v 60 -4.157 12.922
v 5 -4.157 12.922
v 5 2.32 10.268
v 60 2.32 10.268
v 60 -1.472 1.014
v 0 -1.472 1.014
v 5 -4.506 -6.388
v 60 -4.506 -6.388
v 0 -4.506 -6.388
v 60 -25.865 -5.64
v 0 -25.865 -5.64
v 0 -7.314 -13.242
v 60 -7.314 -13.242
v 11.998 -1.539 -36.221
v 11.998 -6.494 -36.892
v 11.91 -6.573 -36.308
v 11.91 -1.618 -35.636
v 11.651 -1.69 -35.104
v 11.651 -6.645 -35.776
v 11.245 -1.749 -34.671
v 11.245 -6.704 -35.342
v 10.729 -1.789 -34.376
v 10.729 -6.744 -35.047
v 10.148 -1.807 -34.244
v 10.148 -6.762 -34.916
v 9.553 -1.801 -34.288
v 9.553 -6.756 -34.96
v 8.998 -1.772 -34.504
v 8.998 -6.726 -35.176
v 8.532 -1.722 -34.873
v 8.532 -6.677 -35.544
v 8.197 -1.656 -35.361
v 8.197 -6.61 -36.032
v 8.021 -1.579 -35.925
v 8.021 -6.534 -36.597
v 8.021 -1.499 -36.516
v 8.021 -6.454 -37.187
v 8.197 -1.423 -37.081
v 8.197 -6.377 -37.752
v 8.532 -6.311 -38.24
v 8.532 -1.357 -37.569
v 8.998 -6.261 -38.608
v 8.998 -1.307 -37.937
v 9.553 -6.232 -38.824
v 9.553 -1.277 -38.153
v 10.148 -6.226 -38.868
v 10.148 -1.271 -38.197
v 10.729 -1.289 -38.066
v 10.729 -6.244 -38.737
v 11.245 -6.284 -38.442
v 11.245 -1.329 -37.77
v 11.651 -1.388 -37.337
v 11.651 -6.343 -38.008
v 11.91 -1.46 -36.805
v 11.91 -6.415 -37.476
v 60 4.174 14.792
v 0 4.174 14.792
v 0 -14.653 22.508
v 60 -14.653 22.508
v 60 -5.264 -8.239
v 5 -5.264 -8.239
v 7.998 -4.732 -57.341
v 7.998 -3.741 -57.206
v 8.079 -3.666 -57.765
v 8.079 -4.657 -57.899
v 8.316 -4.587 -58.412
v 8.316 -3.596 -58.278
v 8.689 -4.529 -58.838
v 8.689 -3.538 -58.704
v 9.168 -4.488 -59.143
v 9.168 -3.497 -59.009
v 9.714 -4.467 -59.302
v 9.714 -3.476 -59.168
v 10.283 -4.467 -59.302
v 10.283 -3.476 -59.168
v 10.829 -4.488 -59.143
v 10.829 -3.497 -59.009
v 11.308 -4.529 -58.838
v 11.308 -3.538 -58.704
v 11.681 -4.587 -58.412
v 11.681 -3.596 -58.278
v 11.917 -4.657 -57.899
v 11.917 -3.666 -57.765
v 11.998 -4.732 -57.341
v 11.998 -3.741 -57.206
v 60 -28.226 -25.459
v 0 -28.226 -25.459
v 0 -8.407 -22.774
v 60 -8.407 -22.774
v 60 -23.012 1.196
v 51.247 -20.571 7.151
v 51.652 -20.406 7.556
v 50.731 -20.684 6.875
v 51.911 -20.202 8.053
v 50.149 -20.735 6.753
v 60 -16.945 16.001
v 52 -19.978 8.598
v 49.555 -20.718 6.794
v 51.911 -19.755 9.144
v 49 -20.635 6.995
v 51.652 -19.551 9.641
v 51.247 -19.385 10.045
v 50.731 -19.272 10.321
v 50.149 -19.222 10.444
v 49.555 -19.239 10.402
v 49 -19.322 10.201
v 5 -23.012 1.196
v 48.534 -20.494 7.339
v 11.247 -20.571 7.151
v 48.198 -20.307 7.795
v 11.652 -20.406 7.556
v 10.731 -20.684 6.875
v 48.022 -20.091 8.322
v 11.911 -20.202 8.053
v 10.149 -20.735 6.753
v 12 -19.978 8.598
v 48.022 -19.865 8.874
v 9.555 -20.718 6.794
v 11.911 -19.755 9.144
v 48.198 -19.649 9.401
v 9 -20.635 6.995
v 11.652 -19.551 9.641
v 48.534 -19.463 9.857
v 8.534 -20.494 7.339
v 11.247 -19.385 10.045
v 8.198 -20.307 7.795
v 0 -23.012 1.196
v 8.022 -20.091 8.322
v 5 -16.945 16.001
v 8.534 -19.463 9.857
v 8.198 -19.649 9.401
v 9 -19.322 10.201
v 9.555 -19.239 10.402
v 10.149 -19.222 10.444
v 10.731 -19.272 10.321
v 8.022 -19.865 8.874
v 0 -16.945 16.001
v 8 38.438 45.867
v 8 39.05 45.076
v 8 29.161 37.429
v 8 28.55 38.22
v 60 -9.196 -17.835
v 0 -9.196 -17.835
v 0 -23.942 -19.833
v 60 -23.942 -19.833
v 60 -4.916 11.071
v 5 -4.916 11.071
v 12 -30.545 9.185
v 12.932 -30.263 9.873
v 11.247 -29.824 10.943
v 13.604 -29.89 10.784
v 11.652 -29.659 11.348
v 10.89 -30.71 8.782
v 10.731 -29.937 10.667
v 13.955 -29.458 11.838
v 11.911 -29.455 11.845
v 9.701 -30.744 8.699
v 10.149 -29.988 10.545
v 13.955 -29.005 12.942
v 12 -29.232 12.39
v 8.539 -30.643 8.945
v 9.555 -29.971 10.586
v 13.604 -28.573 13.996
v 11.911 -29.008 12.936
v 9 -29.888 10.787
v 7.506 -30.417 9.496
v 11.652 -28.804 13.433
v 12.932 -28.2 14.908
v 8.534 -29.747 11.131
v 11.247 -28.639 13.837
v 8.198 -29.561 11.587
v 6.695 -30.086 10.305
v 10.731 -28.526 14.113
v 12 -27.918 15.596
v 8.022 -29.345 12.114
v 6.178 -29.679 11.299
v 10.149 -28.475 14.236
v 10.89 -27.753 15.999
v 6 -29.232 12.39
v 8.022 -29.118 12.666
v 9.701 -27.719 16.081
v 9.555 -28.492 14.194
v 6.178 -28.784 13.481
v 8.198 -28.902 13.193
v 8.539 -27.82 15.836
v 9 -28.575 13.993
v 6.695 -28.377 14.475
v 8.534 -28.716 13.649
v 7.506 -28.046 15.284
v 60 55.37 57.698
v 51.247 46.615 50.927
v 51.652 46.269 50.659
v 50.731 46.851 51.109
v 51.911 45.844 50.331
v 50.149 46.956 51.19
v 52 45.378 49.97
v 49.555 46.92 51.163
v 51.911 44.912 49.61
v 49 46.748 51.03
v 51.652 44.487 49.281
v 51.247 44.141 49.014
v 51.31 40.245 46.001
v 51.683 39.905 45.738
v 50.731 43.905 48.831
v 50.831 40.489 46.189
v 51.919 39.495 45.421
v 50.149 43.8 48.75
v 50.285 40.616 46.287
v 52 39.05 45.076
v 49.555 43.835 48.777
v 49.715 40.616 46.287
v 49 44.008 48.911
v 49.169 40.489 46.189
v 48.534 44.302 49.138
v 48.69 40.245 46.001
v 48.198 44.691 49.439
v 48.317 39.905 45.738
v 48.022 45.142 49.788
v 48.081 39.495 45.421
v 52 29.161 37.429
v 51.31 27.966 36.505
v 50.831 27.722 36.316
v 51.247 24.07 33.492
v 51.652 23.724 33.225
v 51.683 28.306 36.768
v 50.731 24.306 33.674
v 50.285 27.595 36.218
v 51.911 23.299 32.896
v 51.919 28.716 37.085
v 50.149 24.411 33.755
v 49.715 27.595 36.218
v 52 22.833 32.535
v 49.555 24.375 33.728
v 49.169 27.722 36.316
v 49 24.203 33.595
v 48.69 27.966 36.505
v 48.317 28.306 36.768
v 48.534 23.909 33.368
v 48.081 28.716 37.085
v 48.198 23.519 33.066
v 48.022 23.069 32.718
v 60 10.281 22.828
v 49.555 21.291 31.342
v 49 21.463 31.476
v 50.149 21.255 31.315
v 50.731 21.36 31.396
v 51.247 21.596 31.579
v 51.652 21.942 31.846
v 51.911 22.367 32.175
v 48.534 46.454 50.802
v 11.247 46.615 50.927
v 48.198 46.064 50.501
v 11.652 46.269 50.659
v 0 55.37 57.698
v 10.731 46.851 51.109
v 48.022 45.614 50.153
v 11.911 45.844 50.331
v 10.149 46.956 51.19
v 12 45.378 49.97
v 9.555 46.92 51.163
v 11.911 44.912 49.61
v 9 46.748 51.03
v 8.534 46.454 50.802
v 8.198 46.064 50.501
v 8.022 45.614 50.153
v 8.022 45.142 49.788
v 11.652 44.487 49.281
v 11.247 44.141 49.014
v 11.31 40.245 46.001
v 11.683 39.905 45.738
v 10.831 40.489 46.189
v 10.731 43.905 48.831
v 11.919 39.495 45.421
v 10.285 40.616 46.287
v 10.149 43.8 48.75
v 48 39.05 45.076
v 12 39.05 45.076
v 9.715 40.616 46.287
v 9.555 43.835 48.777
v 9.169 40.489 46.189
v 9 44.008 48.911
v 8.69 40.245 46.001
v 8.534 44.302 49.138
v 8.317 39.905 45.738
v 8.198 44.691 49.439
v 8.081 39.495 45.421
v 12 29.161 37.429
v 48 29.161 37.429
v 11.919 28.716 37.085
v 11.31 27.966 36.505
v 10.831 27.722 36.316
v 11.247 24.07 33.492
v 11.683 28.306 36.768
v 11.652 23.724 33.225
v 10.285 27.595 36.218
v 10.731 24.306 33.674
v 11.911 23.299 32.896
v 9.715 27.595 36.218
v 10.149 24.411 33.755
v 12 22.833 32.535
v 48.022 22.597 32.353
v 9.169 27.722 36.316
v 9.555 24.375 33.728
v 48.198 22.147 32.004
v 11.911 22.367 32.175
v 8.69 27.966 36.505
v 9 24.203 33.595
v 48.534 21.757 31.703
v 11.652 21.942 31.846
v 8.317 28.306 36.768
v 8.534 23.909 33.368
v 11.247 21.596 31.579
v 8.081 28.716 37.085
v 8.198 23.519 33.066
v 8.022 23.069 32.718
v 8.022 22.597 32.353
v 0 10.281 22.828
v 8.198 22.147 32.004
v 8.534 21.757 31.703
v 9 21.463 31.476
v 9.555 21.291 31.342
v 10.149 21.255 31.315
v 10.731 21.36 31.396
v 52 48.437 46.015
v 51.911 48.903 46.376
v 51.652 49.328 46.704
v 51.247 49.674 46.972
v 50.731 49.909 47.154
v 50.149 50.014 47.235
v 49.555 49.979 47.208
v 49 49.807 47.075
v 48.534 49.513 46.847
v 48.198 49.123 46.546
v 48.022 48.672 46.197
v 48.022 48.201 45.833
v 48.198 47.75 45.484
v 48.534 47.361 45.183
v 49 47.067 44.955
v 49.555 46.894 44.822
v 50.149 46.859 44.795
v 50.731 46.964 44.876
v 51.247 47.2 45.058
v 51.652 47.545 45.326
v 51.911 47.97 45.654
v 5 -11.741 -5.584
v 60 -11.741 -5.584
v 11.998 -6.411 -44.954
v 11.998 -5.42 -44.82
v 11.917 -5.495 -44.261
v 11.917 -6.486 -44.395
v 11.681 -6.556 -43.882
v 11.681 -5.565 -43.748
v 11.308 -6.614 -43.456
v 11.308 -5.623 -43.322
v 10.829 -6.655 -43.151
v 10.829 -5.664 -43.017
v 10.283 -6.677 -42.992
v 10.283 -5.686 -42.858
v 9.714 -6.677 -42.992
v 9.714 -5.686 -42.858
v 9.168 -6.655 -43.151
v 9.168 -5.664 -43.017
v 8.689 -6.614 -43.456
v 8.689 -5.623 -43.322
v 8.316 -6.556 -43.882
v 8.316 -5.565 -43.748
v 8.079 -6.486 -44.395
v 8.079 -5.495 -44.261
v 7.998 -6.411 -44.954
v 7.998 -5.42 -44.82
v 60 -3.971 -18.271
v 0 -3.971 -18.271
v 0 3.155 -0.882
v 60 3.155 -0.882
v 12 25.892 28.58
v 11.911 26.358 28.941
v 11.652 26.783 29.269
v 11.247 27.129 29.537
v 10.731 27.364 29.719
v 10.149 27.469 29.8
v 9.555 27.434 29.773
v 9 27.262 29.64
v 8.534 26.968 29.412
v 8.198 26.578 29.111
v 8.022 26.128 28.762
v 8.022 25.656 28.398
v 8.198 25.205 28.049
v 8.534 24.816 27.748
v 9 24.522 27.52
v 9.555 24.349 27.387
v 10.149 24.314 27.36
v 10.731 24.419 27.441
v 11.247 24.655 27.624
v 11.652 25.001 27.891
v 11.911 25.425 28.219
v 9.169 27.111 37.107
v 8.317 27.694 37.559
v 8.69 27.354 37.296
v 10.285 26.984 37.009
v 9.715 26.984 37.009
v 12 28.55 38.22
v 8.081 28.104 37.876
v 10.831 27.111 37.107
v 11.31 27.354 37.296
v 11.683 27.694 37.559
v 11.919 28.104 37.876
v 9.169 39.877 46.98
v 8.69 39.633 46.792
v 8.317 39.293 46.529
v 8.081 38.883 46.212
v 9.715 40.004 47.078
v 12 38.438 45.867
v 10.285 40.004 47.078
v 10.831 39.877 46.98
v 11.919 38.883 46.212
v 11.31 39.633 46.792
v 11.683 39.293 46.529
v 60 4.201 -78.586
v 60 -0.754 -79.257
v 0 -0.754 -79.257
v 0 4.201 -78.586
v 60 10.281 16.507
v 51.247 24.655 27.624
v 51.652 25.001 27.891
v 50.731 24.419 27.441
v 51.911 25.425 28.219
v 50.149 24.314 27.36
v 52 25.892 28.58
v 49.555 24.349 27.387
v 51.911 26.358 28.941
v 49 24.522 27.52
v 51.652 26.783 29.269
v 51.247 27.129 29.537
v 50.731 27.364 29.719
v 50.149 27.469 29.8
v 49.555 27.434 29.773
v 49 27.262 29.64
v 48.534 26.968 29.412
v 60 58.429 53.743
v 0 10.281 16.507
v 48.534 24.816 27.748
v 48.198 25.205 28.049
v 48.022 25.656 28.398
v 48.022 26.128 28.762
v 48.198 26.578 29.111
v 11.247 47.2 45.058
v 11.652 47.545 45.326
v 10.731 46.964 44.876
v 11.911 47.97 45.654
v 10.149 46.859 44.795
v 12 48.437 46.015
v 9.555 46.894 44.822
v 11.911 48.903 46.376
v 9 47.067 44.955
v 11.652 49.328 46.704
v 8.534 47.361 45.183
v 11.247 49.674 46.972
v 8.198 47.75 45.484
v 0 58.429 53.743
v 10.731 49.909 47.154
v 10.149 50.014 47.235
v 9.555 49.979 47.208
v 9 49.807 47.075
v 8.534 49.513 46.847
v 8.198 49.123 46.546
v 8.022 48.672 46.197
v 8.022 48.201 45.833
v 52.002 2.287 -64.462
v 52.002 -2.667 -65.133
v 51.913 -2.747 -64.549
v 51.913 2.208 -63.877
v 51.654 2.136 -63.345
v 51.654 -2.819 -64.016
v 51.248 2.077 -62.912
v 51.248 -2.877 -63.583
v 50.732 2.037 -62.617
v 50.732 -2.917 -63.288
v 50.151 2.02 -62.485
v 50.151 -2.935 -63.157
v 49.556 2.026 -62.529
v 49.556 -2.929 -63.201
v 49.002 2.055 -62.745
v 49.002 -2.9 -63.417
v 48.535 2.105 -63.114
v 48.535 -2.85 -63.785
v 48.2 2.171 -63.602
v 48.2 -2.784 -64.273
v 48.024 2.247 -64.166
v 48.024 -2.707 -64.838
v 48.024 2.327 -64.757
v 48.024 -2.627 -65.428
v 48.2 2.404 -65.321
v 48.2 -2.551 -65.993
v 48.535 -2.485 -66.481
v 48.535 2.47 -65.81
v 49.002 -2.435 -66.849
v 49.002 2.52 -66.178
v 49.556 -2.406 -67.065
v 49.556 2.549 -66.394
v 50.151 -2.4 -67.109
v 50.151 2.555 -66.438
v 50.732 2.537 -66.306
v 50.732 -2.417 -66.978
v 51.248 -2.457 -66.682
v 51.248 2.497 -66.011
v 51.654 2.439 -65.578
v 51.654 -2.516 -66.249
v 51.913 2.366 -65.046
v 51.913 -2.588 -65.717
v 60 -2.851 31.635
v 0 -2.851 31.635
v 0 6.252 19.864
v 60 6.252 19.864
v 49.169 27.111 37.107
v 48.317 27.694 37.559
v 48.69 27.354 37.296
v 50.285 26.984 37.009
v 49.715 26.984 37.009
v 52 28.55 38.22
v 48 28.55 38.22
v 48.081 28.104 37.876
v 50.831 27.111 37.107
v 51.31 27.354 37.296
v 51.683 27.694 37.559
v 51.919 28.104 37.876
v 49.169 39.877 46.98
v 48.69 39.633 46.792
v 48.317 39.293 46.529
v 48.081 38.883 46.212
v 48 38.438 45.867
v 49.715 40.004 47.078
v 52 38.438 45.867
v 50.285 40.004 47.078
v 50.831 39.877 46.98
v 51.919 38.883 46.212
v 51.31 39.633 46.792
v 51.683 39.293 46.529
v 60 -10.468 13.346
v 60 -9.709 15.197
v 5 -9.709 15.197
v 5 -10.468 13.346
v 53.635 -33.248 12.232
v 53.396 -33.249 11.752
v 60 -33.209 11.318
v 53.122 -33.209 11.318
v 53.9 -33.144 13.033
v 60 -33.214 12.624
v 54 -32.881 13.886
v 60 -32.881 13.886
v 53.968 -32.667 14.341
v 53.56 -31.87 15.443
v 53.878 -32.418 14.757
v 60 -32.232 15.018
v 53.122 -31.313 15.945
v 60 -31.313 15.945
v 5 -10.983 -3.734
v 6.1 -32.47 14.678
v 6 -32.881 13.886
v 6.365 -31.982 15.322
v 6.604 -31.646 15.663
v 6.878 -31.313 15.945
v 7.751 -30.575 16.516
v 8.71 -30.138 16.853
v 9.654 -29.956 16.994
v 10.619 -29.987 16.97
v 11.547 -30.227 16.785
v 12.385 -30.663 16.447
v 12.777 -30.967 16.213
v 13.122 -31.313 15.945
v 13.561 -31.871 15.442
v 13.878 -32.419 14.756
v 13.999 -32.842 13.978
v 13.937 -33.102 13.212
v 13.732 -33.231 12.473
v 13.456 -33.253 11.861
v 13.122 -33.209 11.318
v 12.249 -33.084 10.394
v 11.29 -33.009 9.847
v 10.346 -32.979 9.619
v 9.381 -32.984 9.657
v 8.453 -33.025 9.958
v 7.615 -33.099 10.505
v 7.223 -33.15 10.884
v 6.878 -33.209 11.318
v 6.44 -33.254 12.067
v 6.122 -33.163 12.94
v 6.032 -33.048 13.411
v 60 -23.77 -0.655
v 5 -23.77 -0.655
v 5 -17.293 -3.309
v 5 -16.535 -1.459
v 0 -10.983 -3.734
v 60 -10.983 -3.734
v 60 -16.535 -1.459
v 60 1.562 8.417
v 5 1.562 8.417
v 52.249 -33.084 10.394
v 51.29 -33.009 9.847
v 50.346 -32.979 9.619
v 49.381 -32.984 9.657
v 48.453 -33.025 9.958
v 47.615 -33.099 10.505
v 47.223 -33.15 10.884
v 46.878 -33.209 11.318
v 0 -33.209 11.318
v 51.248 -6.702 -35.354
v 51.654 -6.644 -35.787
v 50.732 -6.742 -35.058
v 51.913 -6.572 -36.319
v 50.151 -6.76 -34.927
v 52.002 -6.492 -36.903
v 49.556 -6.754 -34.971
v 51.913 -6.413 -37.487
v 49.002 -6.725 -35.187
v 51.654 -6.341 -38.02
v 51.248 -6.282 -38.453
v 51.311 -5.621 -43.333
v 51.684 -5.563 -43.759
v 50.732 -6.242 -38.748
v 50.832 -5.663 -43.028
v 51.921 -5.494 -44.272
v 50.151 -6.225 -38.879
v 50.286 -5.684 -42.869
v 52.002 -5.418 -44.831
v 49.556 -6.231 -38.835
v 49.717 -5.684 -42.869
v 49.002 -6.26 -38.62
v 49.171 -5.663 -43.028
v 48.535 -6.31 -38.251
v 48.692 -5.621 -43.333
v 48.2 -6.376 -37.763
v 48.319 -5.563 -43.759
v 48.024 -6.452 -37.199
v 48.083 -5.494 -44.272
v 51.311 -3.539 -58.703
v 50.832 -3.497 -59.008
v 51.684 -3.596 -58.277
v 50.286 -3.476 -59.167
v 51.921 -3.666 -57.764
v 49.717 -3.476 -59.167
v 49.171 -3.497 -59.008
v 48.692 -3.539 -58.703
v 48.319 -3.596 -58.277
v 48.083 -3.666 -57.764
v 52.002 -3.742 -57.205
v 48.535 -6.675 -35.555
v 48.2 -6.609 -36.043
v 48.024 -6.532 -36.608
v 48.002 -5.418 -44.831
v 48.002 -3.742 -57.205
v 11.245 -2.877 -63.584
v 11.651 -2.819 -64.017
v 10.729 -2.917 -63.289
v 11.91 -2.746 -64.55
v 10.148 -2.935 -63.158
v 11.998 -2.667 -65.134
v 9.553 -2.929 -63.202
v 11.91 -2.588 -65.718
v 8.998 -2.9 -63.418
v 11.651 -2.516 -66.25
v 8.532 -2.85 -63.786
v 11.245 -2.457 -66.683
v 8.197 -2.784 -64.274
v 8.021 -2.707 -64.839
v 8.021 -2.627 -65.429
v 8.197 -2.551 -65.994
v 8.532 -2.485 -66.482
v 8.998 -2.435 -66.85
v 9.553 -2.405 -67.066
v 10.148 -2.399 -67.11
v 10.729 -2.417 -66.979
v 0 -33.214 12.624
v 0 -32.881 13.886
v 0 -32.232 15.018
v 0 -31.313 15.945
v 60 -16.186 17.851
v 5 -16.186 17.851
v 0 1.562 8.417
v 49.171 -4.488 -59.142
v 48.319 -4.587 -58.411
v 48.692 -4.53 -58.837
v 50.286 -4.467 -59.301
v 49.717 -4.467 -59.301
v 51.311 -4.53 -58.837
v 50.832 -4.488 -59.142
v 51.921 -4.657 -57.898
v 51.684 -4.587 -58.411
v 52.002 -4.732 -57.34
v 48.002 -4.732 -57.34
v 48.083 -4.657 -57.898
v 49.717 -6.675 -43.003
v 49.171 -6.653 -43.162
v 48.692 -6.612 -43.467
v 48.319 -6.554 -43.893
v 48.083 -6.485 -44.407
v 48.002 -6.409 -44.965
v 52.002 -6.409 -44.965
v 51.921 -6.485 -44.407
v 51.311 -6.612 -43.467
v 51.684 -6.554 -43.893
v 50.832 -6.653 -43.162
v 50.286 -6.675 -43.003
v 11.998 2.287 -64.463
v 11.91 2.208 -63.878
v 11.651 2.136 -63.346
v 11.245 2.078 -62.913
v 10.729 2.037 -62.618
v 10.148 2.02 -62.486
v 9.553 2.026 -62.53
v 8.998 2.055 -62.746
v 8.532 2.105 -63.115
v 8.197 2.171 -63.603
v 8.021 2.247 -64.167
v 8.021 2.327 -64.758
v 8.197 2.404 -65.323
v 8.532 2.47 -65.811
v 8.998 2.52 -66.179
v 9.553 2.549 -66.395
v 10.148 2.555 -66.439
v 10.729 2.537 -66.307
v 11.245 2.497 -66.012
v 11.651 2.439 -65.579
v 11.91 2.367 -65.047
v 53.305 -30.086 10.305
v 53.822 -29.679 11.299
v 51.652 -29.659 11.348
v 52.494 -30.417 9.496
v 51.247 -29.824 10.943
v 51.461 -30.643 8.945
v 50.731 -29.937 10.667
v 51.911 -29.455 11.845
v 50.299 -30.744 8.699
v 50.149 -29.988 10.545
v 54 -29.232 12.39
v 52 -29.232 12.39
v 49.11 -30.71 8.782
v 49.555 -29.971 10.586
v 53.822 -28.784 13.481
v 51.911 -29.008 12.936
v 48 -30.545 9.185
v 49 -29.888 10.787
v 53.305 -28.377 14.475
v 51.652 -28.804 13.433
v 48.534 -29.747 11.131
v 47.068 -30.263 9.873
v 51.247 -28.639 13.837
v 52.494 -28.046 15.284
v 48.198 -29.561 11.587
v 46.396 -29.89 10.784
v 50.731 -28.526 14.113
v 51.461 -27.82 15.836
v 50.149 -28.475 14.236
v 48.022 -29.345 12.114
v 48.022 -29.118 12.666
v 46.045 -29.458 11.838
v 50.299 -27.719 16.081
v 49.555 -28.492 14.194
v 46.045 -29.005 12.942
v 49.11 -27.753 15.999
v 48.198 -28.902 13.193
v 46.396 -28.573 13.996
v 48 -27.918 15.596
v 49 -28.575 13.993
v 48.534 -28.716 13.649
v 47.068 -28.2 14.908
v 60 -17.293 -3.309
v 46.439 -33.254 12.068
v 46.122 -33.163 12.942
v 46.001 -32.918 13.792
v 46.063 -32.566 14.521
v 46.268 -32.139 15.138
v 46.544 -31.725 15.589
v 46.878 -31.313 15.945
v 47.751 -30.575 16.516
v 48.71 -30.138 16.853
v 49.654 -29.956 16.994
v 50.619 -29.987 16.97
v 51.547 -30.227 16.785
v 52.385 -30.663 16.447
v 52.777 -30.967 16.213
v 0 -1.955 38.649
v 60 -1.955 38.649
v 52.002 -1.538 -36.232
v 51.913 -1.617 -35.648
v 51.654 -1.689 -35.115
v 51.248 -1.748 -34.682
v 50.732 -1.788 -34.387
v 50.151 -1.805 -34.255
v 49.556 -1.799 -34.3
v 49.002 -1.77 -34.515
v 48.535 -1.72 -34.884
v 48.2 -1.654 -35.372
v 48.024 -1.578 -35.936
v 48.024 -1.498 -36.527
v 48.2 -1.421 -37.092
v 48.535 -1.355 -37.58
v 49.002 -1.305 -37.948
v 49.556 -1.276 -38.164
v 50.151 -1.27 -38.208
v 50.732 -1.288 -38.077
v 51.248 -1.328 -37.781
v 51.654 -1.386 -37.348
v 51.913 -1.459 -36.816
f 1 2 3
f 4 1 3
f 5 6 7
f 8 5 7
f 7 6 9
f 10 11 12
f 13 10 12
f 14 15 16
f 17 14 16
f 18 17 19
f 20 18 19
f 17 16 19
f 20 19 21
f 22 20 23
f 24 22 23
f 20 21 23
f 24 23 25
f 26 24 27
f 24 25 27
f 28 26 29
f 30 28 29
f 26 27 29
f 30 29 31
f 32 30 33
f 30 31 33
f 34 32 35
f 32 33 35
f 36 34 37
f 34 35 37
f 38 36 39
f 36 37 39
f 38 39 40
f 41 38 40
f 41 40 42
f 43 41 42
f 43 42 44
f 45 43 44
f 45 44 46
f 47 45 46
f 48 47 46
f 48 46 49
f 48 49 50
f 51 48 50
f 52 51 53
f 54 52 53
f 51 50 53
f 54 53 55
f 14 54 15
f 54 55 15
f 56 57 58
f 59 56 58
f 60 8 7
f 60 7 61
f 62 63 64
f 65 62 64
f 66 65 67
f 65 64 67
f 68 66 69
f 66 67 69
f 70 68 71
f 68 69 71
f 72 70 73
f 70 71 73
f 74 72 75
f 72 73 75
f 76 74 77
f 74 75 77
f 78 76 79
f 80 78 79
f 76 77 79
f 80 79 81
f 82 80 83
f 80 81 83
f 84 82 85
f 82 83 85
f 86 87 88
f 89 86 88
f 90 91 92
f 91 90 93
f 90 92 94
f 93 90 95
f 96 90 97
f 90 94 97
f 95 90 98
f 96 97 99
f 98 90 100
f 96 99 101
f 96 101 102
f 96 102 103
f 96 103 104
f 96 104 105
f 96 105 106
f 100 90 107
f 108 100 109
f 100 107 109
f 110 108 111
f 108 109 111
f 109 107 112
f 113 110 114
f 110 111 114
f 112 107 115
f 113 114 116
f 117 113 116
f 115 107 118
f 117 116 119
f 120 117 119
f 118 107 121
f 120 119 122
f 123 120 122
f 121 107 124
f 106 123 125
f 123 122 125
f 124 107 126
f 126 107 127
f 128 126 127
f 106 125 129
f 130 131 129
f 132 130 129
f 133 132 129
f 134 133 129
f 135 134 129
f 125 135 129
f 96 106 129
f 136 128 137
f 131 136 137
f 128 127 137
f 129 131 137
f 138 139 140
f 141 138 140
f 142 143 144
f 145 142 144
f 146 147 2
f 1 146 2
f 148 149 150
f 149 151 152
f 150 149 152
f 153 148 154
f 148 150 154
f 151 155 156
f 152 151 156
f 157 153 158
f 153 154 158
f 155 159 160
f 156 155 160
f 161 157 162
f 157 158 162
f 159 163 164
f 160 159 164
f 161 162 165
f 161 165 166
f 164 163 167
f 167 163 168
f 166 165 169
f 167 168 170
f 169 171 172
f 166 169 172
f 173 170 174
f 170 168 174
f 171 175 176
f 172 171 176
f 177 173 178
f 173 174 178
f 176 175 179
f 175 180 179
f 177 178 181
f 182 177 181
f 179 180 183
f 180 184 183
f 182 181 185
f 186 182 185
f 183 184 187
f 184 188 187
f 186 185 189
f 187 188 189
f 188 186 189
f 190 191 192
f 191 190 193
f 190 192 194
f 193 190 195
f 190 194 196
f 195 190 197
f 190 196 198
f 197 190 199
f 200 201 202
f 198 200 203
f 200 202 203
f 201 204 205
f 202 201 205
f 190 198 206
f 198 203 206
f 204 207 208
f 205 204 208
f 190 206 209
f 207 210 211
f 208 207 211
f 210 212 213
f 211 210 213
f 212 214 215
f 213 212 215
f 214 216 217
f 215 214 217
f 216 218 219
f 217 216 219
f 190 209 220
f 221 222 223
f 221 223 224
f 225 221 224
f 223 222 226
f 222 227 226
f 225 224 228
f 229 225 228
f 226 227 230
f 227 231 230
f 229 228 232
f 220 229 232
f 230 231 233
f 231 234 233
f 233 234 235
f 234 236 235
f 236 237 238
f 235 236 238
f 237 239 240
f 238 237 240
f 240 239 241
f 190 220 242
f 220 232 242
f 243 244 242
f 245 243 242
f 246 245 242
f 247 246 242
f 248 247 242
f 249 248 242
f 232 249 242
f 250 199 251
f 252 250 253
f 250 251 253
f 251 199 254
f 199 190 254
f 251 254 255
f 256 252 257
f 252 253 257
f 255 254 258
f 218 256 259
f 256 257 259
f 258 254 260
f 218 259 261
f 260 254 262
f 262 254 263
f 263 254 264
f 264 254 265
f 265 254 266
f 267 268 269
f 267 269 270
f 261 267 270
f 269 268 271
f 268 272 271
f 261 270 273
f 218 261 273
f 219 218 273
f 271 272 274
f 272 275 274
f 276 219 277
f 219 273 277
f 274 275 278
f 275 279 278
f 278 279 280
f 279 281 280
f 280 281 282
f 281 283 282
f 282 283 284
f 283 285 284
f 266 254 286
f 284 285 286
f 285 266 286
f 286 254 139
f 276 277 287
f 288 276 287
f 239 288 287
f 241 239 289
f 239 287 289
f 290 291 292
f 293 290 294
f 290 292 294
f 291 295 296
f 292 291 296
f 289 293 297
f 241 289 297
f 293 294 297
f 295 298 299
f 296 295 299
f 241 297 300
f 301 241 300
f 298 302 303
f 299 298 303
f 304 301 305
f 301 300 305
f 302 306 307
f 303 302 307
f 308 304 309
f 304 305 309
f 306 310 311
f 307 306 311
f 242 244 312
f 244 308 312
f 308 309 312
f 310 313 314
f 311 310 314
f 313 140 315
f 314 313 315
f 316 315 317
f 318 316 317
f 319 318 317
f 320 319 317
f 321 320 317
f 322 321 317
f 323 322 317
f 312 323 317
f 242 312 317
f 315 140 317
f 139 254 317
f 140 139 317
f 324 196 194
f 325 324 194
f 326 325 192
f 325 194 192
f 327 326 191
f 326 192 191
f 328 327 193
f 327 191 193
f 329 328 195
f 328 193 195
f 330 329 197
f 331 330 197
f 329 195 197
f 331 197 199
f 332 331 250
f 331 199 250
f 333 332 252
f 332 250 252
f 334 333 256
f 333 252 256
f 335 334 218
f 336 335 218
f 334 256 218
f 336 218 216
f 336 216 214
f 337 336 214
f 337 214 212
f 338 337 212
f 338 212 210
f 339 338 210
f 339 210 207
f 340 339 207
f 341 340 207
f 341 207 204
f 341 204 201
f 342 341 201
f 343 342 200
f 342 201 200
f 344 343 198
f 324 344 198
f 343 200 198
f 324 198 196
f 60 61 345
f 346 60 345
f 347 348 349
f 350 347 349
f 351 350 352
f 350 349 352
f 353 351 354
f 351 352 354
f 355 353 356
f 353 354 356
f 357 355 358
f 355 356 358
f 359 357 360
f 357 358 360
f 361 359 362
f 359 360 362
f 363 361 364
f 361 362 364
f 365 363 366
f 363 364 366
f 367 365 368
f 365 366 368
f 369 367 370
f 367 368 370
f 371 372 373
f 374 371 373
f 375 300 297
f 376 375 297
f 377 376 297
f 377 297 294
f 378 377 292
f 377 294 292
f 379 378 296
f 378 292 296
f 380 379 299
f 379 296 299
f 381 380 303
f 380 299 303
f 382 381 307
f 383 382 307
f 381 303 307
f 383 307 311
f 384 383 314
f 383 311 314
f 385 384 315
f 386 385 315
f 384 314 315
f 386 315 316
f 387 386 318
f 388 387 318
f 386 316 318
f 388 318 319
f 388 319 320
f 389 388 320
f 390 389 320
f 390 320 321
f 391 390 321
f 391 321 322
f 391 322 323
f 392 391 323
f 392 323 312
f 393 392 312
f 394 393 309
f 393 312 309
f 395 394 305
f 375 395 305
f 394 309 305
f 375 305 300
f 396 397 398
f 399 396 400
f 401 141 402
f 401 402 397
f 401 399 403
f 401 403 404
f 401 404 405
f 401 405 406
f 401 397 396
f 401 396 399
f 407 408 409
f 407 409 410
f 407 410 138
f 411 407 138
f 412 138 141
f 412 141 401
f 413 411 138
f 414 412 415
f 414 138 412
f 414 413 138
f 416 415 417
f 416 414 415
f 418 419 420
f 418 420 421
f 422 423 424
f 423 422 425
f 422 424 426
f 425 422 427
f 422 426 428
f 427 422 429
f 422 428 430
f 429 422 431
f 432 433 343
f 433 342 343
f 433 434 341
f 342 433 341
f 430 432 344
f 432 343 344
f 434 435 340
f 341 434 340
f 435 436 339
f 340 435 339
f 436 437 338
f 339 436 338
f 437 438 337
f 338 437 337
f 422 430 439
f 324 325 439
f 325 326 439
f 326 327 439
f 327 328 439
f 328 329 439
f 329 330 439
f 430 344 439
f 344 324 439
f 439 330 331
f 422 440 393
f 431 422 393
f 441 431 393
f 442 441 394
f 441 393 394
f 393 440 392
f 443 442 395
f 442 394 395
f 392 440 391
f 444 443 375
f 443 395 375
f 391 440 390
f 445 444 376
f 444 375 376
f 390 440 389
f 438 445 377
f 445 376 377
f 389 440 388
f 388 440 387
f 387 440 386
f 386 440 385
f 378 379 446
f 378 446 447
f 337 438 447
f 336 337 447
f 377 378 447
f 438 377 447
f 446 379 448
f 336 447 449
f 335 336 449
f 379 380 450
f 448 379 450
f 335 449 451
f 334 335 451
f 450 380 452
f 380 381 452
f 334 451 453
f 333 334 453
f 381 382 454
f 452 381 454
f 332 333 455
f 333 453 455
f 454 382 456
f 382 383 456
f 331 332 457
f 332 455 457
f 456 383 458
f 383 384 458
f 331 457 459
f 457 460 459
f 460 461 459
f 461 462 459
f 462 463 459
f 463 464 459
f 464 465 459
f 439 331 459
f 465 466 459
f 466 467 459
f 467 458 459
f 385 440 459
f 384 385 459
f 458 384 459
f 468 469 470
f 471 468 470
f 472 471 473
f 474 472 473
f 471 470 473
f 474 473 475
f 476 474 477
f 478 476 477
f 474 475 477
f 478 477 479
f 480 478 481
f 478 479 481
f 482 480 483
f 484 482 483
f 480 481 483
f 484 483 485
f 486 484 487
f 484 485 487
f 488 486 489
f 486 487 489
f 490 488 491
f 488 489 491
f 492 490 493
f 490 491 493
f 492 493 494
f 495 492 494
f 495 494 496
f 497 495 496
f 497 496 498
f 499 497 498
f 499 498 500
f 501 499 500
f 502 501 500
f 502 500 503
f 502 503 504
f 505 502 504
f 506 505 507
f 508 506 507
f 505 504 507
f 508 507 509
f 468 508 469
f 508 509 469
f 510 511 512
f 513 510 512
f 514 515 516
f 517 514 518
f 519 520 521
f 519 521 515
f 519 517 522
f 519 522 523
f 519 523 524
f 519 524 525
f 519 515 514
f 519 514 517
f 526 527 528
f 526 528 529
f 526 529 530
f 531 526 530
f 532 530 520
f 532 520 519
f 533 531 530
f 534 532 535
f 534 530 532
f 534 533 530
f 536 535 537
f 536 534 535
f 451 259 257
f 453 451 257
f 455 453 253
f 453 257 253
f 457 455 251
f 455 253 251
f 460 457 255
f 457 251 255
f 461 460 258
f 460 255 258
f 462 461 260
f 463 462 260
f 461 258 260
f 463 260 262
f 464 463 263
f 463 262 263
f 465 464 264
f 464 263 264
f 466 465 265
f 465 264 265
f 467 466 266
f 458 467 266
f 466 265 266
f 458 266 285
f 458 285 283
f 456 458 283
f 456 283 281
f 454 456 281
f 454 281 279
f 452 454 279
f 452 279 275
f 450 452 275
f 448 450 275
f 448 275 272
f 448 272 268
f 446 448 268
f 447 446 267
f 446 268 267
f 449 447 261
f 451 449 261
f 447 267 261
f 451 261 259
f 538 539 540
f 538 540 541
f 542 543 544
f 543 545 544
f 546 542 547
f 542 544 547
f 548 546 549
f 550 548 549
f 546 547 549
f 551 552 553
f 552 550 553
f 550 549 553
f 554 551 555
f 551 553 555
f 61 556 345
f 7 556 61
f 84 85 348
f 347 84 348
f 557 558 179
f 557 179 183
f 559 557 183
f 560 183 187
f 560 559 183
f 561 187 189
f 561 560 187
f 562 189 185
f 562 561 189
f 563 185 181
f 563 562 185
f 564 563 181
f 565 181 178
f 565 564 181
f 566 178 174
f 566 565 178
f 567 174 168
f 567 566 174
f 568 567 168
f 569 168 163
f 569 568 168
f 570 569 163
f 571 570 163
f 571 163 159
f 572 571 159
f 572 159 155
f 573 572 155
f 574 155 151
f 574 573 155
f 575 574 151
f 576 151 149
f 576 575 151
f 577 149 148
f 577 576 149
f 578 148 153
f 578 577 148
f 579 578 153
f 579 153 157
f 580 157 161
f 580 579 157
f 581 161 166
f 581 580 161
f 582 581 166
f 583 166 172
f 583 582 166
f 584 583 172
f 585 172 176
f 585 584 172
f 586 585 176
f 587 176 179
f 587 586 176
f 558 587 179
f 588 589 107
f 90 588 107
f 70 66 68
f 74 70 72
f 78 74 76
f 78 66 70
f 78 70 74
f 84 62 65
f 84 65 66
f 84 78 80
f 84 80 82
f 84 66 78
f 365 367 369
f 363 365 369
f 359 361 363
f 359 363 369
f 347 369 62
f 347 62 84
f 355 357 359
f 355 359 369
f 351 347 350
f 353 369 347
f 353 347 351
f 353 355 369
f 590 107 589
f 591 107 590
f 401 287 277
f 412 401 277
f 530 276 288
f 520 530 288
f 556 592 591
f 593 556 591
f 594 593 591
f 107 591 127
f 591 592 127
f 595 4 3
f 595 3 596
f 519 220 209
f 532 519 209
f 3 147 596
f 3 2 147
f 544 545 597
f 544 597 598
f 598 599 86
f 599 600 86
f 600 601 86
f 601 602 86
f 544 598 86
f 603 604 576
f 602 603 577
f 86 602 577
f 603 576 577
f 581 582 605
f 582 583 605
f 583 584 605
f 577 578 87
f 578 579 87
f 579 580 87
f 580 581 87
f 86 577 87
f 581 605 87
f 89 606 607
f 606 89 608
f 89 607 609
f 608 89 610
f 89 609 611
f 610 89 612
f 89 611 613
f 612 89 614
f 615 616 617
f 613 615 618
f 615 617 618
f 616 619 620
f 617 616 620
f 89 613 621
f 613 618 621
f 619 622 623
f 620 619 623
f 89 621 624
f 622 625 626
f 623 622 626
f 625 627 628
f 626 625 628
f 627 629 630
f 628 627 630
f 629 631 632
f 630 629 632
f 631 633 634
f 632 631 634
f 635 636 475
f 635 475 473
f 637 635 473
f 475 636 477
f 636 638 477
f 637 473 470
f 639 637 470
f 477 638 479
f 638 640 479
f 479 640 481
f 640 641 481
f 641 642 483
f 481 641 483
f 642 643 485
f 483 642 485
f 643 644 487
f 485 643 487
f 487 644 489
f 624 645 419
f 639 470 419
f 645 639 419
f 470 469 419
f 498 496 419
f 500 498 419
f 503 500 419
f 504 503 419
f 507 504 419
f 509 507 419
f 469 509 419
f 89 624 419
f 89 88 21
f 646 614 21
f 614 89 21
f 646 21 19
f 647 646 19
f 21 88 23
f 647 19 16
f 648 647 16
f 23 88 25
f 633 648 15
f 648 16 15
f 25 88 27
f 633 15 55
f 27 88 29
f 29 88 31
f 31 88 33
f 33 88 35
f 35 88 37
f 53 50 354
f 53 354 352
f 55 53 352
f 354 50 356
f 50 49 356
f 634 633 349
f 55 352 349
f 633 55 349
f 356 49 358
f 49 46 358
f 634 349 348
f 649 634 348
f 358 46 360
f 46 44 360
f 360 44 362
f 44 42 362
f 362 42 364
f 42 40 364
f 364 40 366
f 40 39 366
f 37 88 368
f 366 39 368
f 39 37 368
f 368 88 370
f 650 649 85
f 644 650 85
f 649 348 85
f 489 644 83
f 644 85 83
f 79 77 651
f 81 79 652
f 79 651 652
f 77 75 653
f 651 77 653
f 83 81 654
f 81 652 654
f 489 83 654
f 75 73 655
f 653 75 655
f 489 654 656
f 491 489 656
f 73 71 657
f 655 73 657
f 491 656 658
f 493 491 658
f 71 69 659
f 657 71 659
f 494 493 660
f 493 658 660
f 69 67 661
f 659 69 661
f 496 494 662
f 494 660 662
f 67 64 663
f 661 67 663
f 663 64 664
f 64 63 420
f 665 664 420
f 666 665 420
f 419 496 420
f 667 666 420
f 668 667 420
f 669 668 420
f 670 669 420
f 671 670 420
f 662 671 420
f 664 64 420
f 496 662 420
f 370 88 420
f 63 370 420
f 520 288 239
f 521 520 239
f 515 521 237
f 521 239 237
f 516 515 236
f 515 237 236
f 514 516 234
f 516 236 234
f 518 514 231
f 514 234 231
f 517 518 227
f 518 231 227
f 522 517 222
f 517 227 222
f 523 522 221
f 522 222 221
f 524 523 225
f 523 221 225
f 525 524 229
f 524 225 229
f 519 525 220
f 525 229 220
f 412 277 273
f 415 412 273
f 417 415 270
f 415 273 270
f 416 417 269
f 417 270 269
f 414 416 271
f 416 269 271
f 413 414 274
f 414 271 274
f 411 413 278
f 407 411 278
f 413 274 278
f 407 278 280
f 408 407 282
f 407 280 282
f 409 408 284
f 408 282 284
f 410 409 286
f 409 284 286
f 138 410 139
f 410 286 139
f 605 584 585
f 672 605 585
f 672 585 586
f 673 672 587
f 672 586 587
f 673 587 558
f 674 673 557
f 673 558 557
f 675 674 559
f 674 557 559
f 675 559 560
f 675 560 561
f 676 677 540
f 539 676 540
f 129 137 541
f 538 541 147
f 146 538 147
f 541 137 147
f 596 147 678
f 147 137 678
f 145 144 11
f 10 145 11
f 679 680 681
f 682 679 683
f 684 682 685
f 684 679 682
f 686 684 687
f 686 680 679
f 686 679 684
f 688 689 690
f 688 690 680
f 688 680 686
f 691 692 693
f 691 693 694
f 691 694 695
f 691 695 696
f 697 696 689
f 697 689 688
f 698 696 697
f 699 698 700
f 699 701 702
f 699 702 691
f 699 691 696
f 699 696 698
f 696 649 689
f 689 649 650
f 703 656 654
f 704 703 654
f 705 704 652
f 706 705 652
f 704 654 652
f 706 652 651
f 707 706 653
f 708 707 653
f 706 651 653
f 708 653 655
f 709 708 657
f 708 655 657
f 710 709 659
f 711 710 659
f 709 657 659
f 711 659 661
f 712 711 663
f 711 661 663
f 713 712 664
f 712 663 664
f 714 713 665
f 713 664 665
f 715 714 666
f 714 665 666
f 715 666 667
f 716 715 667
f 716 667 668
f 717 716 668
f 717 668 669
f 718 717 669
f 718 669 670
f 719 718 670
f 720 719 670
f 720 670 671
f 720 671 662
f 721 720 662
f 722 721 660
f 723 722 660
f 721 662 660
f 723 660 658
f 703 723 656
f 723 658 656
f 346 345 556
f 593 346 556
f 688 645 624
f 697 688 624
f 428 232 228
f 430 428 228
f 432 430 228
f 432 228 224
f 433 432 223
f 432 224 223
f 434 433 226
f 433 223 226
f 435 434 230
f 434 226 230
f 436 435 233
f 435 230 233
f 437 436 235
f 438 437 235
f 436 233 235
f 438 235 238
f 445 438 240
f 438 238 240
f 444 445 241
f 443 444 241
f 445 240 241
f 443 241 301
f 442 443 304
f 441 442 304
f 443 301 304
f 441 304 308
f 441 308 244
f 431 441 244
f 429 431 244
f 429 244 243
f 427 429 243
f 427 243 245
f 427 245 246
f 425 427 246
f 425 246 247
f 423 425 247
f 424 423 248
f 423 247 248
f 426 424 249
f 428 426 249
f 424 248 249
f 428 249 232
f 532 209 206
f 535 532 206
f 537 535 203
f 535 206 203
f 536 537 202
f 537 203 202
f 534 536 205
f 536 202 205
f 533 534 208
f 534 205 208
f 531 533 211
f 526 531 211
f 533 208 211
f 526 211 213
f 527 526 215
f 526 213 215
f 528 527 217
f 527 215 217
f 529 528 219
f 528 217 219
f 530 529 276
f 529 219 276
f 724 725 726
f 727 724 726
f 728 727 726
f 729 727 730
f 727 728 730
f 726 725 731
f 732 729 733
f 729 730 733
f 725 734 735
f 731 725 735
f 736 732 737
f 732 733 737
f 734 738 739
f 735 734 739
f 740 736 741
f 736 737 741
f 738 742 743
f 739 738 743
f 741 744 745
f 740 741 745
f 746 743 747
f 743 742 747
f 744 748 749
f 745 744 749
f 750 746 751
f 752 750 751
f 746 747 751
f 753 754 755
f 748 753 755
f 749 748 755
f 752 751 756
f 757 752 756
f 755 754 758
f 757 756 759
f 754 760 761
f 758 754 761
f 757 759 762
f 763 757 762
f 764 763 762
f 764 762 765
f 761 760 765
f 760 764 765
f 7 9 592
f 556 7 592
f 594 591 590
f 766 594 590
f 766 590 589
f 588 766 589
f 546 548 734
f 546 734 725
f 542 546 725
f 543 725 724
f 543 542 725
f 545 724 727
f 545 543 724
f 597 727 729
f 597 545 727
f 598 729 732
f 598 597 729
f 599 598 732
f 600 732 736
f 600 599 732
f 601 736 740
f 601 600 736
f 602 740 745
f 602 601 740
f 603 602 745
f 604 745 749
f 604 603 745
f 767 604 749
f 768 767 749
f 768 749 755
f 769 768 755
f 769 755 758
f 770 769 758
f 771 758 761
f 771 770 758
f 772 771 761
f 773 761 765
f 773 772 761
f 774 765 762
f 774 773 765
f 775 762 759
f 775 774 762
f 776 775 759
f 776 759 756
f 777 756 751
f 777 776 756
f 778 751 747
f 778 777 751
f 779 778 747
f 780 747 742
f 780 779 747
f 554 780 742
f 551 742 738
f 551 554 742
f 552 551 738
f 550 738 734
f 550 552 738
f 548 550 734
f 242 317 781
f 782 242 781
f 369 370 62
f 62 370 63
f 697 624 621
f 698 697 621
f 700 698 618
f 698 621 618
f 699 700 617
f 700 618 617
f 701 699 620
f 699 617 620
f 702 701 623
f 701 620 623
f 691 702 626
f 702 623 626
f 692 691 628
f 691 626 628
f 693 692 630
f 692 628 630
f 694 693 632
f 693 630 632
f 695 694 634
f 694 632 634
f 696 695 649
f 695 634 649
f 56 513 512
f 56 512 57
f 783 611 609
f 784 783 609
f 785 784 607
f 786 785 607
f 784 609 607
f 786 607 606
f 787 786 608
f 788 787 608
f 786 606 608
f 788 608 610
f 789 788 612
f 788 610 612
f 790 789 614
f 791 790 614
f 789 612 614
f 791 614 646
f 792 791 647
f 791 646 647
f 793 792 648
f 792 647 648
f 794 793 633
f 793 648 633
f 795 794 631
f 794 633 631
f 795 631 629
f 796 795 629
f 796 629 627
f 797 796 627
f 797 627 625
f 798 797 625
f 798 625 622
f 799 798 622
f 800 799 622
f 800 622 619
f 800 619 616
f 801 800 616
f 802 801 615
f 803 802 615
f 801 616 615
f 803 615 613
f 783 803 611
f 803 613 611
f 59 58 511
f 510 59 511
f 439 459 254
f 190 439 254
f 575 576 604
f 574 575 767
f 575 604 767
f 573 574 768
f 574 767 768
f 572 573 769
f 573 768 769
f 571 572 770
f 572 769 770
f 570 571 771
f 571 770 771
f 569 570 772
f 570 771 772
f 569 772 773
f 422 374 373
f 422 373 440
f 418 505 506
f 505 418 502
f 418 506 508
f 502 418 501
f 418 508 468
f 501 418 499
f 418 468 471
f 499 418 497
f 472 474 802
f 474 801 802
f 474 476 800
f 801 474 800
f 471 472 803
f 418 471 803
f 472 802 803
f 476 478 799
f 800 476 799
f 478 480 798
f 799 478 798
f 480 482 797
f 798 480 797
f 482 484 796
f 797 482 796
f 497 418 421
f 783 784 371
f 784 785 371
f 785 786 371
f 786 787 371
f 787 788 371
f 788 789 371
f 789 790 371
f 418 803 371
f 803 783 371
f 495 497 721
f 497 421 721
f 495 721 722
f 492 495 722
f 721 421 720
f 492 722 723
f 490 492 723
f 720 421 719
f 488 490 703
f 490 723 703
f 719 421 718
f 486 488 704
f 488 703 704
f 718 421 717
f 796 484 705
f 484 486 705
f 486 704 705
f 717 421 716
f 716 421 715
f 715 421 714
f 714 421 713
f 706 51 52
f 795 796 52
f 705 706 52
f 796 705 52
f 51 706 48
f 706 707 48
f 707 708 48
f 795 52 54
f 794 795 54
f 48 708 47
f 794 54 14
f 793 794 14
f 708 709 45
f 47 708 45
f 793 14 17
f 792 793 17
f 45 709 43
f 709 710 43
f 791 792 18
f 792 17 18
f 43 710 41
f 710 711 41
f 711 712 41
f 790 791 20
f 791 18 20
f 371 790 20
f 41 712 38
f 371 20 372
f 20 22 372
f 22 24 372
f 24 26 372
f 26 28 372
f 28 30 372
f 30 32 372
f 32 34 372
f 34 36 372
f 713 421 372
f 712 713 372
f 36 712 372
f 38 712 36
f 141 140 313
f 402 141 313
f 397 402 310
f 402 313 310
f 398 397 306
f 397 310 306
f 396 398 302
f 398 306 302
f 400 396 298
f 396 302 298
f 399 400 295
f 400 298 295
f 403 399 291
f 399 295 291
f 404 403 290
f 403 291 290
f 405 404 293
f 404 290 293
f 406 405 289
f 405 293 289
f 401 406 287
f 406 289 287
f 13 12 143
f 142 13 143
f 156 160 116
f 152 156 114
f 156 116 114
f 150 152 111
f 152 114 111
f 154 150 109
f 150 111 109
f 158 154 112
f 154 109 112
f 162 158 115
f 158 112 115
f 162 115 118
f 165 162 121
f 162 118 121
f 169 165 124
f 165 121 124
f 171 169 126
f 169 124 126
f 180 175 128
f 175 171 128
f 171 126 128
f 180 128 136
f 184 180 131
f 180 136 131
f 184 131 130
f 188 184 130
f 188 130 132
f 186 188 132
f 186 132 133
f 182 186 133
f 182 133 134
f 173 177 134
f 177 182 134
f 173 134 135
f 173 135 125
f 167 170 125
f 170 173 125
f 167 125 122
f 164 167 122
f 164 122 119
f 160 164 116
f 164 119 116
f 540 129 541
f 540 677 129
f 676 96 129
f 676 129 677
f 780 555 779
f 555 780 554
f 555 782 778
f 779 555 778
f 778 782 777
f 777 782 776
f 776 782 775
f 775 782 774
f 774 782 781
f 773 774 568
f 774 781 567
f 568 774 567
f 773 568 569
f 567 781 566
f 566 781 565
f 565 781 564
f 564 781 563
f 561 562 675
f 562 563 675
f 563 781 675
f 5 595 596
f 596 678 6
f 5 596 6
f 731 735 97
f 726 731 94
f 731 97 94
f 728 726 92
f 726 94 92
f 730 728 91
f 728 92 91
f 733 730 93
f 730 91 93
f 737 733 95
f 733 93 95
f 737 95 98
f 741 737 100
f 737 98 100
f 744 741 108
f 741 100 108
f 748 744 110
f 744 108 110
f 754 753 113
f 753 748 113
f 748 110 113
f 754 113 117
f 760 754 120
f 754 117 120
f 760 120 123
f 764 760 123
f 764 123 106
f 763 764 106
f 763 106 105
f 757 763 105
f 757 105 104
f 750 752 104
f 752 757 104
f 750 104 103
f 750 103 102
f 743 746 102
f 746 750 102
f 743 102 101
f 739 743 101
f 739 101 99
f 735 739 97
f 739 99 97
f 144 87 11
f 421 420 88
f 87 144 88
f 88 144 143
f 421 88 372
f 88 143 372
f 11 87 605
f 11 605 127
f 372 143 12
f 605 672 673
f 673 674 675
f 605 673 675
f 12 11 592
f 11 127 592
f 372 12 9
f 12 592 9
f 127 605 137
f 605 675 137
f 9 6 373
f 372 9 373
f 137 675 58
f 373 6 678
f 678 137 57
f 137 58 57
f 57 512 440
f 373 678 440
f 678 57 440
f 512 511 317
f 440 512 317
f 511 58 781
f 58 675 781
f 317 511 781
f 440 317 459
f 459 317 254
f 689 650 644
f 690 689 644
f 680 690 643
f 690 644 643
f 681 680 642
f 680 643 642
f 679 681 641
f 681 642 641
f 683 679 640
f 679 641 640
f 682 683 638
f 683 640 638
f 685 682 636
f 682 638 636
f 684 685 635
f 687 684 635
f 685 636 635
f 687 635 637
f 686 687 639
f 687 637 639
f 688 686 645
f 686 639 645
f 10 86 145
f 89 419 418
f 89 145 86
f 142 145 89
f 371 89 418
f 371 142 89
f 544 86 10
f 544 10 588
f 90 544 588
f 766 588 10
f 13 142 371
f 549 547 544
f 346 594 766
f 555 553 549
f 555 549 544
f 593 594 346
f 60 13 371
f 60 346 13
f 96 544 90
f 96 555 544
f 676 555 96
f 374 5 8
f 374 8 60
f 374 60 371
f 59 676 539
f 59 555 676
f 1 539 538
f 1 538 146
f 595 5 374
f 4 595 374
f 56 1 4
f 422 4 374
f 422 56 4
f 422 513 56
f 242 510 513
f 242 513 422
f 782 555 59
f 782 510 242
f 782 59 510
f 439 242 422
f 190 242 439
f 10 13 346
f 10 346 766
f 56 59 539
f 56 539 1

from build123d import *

# Parameters (mm, degrees)
F1_DEPTH  = 60
F2_DEPTH  = 5
F3_DEPTH  = 60
F4_R      = 5
F7_DEPTH  = 5
F8_DEPTH  = 5
F9_DEPTH  = 1
F10_DEPTH = 1
F12_DEPTH = 25
F13_DEPTH = 20
F14_DEPTH = 10


with BuildPart() as f1:
    # F0 (on Right) → F1 (new body)
    with BuildSketch(Plane.YZ):
        Polygon((-1.9545168432, 38.6489601963), (-33.5964987424, 14.1788767986), (-28.2257758369, -25.4589250511), (-8.406874912, -22.7735635983), (-0.7535947717, -79.2574312341), (4.2011304595, -78.5860908709), (-3.9713255886, -18.2705245759), (3.1545996335, -0.8816359607), (10.2805248557, 16.5072526545), (58.4291094867, 53.742590351), (55.370349062, 57.6978380884), (10.2805248557, 22.8279692467), align=None)
        Polygon((-25.8654488138, -5.6400241263), (-7.3142972833, -13.2422419285), (-9.1963342424, -17.8348428934), (-23.9423909688, -19.8328594567), align=None, mode=Mode.SUBTRACT)
        Polygon((1.5615552233, 8.4168698067), (-1.4719884671, 1.0143288458), (-4.5055321574, -6.3882121151), (-5.26391808, -8.2388473554), (-11.7411414209, -5.5844966263), (-17.2930471416, -3.3093388585), (-23.7702704824, -0.6549881294), (-23.0118845598, 1.1956471108), (-16.944797179, 16.0007290327), (-16.1864112564, 17.851364273), (-9.7091879156, 15.1970135439), (-4.1572821949, 12.9218557761), (2.3199411459, 10.267505047), align=None, mode=Mode.SUBTRACT)
        Polygon((-14.6534166938, 22.50764705), (-2.8510041559, 31.6349520341), (6.2523573083, 19.863500585), (4.1741345282, 14.7921613112), align=None, mode=Mode.SUBTRACT)
    extrude(amount=F1_DEPTH)

    # F0 (on Right) → F2 (join)
    with BuildSketch(Plane.YZ):
        Polygon((-16.944797179, 16.0007290327), (-10.4675738382, 13.3463783036), (-9.7091879156, 15.1970135439), (-16.1864112564, 17.851364273), align=None)
        Polygon((-4.9156681175, 11.0712205358), (1.5615552233, 8.4168698067), (2.3199411459, 10.267505047), (-4.1572821949, 12.9218557761), align=None)
        Polygon((-5.26391808, -8.2388473554), (-4.5055321574, -6.3882121151), (-10.9827554983, -3.7338613861), (-11.7411414209, -5.5844966263), align=None)
        Polygon((-17.2930471416, -3.3093388585), (-16.534661219, -1.4587036183), (-23.0118845598, 1.1956471108), (-23.7702704824, -0.6549881294), align=None)
    extrude(amount=F2_DEPTH)

    # F0 (on Right) → F3 (join)
    with BuildSketch(Plane.YZ):
        Polygon((-11.7411414209, -5.5844966263), (-10.9827554983, -3.7338613861), (-16.534661219, -1.4587036183), (-17.2930471416, -3.3093388585), align=None)
        Polygon((-10.4675738382, 13.3463783036), (-4.9156681175, 11.0712205358), (-4.1572821949, 12.9218557761), (-9.7091879156, 15.1970135439), align=None)
    extrude(amount=F3_DEPTH)

    # F4
    f4_edges = [f1.edges().sort_by_distance(p)[0] for p in [
        (30, -33.596499, 14.178877),
    ]]
    fillet(f4_edges, radius=F4_R)

    # F6 (on face) → F7 (cut)
    with BuildSketch(Plane(origin=(0, -11.2853910764, -1.5291137632), x_dir=(1, 0, 0), z_dir=(0, -0.9909450462, -0.1342680726))):
        with BuildLine():
            ThreePointArc((7.9984828914, -64.1860215089), (9.9984828914, -66.1860215089), (11.9984828914, -64.1860215089))
            ThreePointArc((11.9984828914, -64.1860215089), (9.9984828914, -62.1860215089), (7.9984828914, -64.1860215089))
        make_face()
        with BuildLine():
            ThreePointArc((7.9984828914, -35.6860233554), (9.9984828914, -37.6860233554), (11.9984828914, -35.6860233554))
            ThreePointArc((11.9984828914, -35.6860233554), (9.9984828914, -33.6860233554), (7.9984828914, -35.6860233554))
        make_face()
        with BuildLine():
            ThreePointArc((48.0015171086, -35.6972638628), (50.0015171086, -37.6972638628), (52.0015171086, -35.6972638628))
            ThreePointArc((52.0015171086, -35.6972638628), (50.0015171086, -33.6972638628), (48.0015171086, -35.6972638628))
        make_face()
        with BuildLine():
            ThreePointArc((48.0015171086, -64.1849918396), (50.0015171086, -66.1849918396), (52.0015171086, -64.1849918396))
            ThreePointArc((52.0015171086, -64.1849918396), (50.0015171086, -62.1849918396), (48.0015171086, -64.1849918396))
        make_face()
    extrude(amount=-F7_DEPTH, mode=Mode.SUBTRACT)

    # F5 (on face) → F8 (cut)
    with BuildSketch(Plane(origin=(0, -7.1996627103, 9.3098006026), x_dir=(1, 0, 0), z_dir=(0, -0.6117520849, 0.7910495475))):
        with BuildLine():
            ThreePointArc((48, 66.4655810893), (50, 64.4655810893), (52, 66.4655810893))
            ThreePointArc((52, 66.4655810893), (50, 68.4655810893), (48, 66.4655810893))
        make_face()
        with BuildLine():
            ThreePointArc((48, 37.9655810893), (50, 35.9655810893), (52, 37.9655810893))
            ThreePointArc((52, 37.9655810893), (50, 39.9655810893), (48, 37.9655810893))
        make_face()
        with BuildLine():
            ThreePointArc((8, 37.9655810893), (10, 35.9655810893), (12, 37.9655810893))
            ThreePointArc((12, 37.9655810893), (10, 39.9655810893), (8, 37.9655810893))
        make_face()
        with BuildLine():
            ThreePointArc((8, 66.4655810893), (10, 64.4655810893), (12, 66.4655810893))
            ThreePointArc((12, 66.4655810893), (10, 68.4655810893), (8, 66.4655810893))
        make_face()
    extrude(amount=-F8_DEPTH, mode=Mode.SUBTRACT)

    # F5 (on face) → F9 (join)
    with BuildSketch(Plane(origin=(0, -7.1996627103, 9.3098006026), x_dir=(1, 0, 0), z_dir=(0, -0.6117520849, 0.7910495475))):
        with BuildLine():
            ThreePointArc((48, 58.4655810893), (50, 56.4655810893), (52, 58.4655810893))
            ThreePointArc((52, 58.4655810893), (50, 60.4655810893), (48, 58.4655810893))
        make_face()
        with BuildLine():
            Line((52, 45.9655810893), (52, 58.4655810893))
            ThreePointArc((52, 58.4655810893), (50, 56.4655810893), (48, 58.4655810893))
            Line((48, 58.4655810893), (48, 45.9655810893))
            ThreePointArc((48, 45.9655810893), (50, 47.9655810893), (52, 45.9655810893))
        make_face()
        with BuildLine():
            ThreePointArc((48, 45.9655810893), (50, 43.9655810893), (52, 45.9655810893))
            ThreePointArc((52, 45.9655810893), (50, 47.9655810893), (48, 45.9655810893))
        make_face()
        with BuildLine():
            ThreePointArc((8, 58.4655810893), (10, 56.4655810893), (12, 58.4655810893))
            ThreePointArc((12, 58.4655810893), (10, 60.4655810893), (8, 58.4655810893))
        make_face()
        with BuildLine():
            ThreePointArc((8, 45.9655810893), (10, 47.9655810893), (12, 45.9655810893))
            Line((12, 45.9655810893), (12, 58.4655810893))
            ThreePointArc((12, 58.4655810893), (10, 56.4655810893), (8, 58.4655810893))
            Line((8, 58.4655810893), (8, 45.9655810893))
        make_face()
        with BuildLine():
            ThreePointArc((8, 45.9655810893), (10, 43.9655810893), (12, 45.9655810893))
            ThreePointArc((12, 45.9655810893), (10, 47.9655810893), (8, 45.9655810893))
        make_face()
    extrude(amount=F9_DEPTH)

    # F6 (on face) → F10 (join)
    with BuildSketch(Plane(origin=(0, -11.2853910764, -1.5291137632), x_dir=(1, 0, 0), z_dir=(0, -0.9909450462, -0.1342680726))):
        with BuildLine():
            ThreePointArc((48.0015171086, -43.6972638628), (50.0015171086, -45.6972638628), (52.0015171086, -43.6972638628))
            ThreePointArc((52.0015171086, -43.6972638628), (50.0015171086, -41.6972638628), (48.0015171086, -43.6972638628))
        make_face()
        with BuildLine():
            Line((52.0015171086, -56.1849918396), (52.0015171086, -43.6972638628))
            ThreePointArc((52.0015171086, -43.6972638628), (50.0015171086, -45.6972638628), (48.0015171086, -43.6972638628))
            Line((48.0015171086, -43.6972638628), (48.0015171086, -56.1849918396))
            ThreePointArc((48.0015171086, -56.1849918396), (50.0015171086, -54.1849918396), (52.0015171086, -56.1849918396))
        make_face()
        with BuildLine():
            ThreePointArc((48.0015171086, -56.1849918396), (50.0015171086, -58.1849918396), (52.0015171086, -56.1849918396))
            ThreePointArc((52.0015171086, -56.1849918396), (50.0015171086, -54.1849918396), (48.0015171086, -56.1849918396))
        make_face()
        with BuildLine():
            ThreePointArc((7.9984828914, -43.6860233554), (9.9984828914, -45.6860233554), (11.9984828914, -43.6860233554))
            ThreePointArc((11.9984828914, -43.6860233554), (9.9984828914, -41.6860233554), (7.9984828914, -43.6860233554))
        make_face()
        with BuildLine():
            ThreePointArc((7.9984828914, -56.1860215089), (9.9984828914, -54.1860215089), (11.9984828914, -56.1860215089))
            Line((11.9984828914, -56.1860215089), (11.9984828914, -43.6860233554))
            ThreePointArc((11.9984828914, -43.6860233554), (9.9984828914, -45.6860233554), (7.9984828914, -43.6860233554))
            Line((7.9984828914, -43.6860233554), (7.9984828914, -56.1860215089))
        make_face()
        with BuildLine():
            ThreePointArc((7.9984828914, -56.1860215089), (9.9984828914, -58.1860215089), (11.9984828914, -56.1860215089))
            ThreePointArc((11.9984828914, -56.1860215089), (9.9984828914, -54.1860215089), (7.9984828914, -56.1860215089))
        make_face()
    extrude(amount=F10_DEPTH)

    # F11 (on face) → F12 (cut)
    with BuildSketch(Plane(origin=(0, -20.1225891662, 8.2461892101), x_dir=(-1, 0, 0), z_dir=(0, 0.9253176201, -0.3791929613))):
        with BuildLine():
            Line((-12, 0.3804086878), (-8, 0.3804086878))
            ThreePointArc((-8, 0.3804086878), (-10, 2.3804086878), (-12, 0.3804086878))
        make_face()
        with BuildLine():
            Line((-52, 0.3804086878), (-48, 0.3804086878))
            ThreePointArc((-48, 0.3804086878), (-50, 2.3804086878), (-52, 0.3804086878))
        make_face()
        with BuildLine():
            ThreePointArc((-52, 0.3804086878), (-50, -1.6195913122), (-48, 0.3804086878))
            Line((-48, 0.3804086878), (-52, 0.3804086878))
        make_face()
        with BuildLine():
            ThreePointArc((-12, 0.3804086878), (-10, -1.6195913122), (-8, 0.3804086878))
            Line((-8, 0.3804086878), (-12, 0.3804086878))
        make_face()
    extrude(amount=-F12_DEPTH, mode=Mode.SUBTRACT)

    # F11 (on face) → F13 (join)
    with BuildSketch(Plane(origin=(0, -20.1225891662, 8.2461892101), x_dir=(-1, 0, 0), z_dir=(0, 0.9253176201, -0.3791929613))):
        with BuildLine():
            Line((-48, 0.3804086878), (-46, 0.3804086878))
            ThreePointArc((-46, 0.3804086878), (-50, 4.3804086878), (-54, 0.3804086878))
            Line((-54, 0.3804086878), (-52, 0.3804086878))
            ThreePointArc((-52, 0.3804086878), (-50, 2.3804086878), (-48, 0.3804086878))
        make_face()
        with BuildLine():
            ThreePointArc((-54, 0.3804086878), (-50, -3.6195913122), (-46, 0.3804086878))
            Line((-46, 0.3804086878), (-48, 0.3804086878))
            ThreePointArc((-48, 0.3804086878), (-50, -1.6195913122), (-52, 0.3804086878))
            Line((-52, 0.3804086878), (-54, 0.3804086878))
        make_face()
        with BuildLine():
            ThreePointArc((-14, 0.3804086878), (-10, -3.6195913122), (-6, 0.3804086878))
            Line((-6, 0.3804086878), (-8, 0.3804086878))
            ThreePointArc((-8, 0.3804086878), (-10, -1.6195913122), (-12, 0.3804086878))
            Line((-12, 0.3804086878), (-14, 0.3804086878))
        make_face()
        with BuildLine():
            Line((-8, 0.3804086878), (-6, 0.3804086878))
            ThreePointArc((-6, 0.3804086878), (-10, 4.3804086878), (-14, 0.3804086878))
            Line((-14, 0.3804086878), (-12, 0.3804086878))
            ThreePointArc((-12, 0.3804086878), (-10, 2.3804086878), (-8, 0.3804086878))
        make_face()
    extrude(amount=-F13_DEPTH)

    # F14 (cut): faces of the model
    f14_faces = [f1.faces().sort_by_distance(p)[0] for p in [
        (7.886862915, -38.4846932718, 16.1820472977),
        (46.113137085, -38.4846932718, 16.1820472977),
    ]]
    extrude(f14_faces, amount=-F14_DEPTH, mode=Mode.SUBTRACT)


solid = f1.part
